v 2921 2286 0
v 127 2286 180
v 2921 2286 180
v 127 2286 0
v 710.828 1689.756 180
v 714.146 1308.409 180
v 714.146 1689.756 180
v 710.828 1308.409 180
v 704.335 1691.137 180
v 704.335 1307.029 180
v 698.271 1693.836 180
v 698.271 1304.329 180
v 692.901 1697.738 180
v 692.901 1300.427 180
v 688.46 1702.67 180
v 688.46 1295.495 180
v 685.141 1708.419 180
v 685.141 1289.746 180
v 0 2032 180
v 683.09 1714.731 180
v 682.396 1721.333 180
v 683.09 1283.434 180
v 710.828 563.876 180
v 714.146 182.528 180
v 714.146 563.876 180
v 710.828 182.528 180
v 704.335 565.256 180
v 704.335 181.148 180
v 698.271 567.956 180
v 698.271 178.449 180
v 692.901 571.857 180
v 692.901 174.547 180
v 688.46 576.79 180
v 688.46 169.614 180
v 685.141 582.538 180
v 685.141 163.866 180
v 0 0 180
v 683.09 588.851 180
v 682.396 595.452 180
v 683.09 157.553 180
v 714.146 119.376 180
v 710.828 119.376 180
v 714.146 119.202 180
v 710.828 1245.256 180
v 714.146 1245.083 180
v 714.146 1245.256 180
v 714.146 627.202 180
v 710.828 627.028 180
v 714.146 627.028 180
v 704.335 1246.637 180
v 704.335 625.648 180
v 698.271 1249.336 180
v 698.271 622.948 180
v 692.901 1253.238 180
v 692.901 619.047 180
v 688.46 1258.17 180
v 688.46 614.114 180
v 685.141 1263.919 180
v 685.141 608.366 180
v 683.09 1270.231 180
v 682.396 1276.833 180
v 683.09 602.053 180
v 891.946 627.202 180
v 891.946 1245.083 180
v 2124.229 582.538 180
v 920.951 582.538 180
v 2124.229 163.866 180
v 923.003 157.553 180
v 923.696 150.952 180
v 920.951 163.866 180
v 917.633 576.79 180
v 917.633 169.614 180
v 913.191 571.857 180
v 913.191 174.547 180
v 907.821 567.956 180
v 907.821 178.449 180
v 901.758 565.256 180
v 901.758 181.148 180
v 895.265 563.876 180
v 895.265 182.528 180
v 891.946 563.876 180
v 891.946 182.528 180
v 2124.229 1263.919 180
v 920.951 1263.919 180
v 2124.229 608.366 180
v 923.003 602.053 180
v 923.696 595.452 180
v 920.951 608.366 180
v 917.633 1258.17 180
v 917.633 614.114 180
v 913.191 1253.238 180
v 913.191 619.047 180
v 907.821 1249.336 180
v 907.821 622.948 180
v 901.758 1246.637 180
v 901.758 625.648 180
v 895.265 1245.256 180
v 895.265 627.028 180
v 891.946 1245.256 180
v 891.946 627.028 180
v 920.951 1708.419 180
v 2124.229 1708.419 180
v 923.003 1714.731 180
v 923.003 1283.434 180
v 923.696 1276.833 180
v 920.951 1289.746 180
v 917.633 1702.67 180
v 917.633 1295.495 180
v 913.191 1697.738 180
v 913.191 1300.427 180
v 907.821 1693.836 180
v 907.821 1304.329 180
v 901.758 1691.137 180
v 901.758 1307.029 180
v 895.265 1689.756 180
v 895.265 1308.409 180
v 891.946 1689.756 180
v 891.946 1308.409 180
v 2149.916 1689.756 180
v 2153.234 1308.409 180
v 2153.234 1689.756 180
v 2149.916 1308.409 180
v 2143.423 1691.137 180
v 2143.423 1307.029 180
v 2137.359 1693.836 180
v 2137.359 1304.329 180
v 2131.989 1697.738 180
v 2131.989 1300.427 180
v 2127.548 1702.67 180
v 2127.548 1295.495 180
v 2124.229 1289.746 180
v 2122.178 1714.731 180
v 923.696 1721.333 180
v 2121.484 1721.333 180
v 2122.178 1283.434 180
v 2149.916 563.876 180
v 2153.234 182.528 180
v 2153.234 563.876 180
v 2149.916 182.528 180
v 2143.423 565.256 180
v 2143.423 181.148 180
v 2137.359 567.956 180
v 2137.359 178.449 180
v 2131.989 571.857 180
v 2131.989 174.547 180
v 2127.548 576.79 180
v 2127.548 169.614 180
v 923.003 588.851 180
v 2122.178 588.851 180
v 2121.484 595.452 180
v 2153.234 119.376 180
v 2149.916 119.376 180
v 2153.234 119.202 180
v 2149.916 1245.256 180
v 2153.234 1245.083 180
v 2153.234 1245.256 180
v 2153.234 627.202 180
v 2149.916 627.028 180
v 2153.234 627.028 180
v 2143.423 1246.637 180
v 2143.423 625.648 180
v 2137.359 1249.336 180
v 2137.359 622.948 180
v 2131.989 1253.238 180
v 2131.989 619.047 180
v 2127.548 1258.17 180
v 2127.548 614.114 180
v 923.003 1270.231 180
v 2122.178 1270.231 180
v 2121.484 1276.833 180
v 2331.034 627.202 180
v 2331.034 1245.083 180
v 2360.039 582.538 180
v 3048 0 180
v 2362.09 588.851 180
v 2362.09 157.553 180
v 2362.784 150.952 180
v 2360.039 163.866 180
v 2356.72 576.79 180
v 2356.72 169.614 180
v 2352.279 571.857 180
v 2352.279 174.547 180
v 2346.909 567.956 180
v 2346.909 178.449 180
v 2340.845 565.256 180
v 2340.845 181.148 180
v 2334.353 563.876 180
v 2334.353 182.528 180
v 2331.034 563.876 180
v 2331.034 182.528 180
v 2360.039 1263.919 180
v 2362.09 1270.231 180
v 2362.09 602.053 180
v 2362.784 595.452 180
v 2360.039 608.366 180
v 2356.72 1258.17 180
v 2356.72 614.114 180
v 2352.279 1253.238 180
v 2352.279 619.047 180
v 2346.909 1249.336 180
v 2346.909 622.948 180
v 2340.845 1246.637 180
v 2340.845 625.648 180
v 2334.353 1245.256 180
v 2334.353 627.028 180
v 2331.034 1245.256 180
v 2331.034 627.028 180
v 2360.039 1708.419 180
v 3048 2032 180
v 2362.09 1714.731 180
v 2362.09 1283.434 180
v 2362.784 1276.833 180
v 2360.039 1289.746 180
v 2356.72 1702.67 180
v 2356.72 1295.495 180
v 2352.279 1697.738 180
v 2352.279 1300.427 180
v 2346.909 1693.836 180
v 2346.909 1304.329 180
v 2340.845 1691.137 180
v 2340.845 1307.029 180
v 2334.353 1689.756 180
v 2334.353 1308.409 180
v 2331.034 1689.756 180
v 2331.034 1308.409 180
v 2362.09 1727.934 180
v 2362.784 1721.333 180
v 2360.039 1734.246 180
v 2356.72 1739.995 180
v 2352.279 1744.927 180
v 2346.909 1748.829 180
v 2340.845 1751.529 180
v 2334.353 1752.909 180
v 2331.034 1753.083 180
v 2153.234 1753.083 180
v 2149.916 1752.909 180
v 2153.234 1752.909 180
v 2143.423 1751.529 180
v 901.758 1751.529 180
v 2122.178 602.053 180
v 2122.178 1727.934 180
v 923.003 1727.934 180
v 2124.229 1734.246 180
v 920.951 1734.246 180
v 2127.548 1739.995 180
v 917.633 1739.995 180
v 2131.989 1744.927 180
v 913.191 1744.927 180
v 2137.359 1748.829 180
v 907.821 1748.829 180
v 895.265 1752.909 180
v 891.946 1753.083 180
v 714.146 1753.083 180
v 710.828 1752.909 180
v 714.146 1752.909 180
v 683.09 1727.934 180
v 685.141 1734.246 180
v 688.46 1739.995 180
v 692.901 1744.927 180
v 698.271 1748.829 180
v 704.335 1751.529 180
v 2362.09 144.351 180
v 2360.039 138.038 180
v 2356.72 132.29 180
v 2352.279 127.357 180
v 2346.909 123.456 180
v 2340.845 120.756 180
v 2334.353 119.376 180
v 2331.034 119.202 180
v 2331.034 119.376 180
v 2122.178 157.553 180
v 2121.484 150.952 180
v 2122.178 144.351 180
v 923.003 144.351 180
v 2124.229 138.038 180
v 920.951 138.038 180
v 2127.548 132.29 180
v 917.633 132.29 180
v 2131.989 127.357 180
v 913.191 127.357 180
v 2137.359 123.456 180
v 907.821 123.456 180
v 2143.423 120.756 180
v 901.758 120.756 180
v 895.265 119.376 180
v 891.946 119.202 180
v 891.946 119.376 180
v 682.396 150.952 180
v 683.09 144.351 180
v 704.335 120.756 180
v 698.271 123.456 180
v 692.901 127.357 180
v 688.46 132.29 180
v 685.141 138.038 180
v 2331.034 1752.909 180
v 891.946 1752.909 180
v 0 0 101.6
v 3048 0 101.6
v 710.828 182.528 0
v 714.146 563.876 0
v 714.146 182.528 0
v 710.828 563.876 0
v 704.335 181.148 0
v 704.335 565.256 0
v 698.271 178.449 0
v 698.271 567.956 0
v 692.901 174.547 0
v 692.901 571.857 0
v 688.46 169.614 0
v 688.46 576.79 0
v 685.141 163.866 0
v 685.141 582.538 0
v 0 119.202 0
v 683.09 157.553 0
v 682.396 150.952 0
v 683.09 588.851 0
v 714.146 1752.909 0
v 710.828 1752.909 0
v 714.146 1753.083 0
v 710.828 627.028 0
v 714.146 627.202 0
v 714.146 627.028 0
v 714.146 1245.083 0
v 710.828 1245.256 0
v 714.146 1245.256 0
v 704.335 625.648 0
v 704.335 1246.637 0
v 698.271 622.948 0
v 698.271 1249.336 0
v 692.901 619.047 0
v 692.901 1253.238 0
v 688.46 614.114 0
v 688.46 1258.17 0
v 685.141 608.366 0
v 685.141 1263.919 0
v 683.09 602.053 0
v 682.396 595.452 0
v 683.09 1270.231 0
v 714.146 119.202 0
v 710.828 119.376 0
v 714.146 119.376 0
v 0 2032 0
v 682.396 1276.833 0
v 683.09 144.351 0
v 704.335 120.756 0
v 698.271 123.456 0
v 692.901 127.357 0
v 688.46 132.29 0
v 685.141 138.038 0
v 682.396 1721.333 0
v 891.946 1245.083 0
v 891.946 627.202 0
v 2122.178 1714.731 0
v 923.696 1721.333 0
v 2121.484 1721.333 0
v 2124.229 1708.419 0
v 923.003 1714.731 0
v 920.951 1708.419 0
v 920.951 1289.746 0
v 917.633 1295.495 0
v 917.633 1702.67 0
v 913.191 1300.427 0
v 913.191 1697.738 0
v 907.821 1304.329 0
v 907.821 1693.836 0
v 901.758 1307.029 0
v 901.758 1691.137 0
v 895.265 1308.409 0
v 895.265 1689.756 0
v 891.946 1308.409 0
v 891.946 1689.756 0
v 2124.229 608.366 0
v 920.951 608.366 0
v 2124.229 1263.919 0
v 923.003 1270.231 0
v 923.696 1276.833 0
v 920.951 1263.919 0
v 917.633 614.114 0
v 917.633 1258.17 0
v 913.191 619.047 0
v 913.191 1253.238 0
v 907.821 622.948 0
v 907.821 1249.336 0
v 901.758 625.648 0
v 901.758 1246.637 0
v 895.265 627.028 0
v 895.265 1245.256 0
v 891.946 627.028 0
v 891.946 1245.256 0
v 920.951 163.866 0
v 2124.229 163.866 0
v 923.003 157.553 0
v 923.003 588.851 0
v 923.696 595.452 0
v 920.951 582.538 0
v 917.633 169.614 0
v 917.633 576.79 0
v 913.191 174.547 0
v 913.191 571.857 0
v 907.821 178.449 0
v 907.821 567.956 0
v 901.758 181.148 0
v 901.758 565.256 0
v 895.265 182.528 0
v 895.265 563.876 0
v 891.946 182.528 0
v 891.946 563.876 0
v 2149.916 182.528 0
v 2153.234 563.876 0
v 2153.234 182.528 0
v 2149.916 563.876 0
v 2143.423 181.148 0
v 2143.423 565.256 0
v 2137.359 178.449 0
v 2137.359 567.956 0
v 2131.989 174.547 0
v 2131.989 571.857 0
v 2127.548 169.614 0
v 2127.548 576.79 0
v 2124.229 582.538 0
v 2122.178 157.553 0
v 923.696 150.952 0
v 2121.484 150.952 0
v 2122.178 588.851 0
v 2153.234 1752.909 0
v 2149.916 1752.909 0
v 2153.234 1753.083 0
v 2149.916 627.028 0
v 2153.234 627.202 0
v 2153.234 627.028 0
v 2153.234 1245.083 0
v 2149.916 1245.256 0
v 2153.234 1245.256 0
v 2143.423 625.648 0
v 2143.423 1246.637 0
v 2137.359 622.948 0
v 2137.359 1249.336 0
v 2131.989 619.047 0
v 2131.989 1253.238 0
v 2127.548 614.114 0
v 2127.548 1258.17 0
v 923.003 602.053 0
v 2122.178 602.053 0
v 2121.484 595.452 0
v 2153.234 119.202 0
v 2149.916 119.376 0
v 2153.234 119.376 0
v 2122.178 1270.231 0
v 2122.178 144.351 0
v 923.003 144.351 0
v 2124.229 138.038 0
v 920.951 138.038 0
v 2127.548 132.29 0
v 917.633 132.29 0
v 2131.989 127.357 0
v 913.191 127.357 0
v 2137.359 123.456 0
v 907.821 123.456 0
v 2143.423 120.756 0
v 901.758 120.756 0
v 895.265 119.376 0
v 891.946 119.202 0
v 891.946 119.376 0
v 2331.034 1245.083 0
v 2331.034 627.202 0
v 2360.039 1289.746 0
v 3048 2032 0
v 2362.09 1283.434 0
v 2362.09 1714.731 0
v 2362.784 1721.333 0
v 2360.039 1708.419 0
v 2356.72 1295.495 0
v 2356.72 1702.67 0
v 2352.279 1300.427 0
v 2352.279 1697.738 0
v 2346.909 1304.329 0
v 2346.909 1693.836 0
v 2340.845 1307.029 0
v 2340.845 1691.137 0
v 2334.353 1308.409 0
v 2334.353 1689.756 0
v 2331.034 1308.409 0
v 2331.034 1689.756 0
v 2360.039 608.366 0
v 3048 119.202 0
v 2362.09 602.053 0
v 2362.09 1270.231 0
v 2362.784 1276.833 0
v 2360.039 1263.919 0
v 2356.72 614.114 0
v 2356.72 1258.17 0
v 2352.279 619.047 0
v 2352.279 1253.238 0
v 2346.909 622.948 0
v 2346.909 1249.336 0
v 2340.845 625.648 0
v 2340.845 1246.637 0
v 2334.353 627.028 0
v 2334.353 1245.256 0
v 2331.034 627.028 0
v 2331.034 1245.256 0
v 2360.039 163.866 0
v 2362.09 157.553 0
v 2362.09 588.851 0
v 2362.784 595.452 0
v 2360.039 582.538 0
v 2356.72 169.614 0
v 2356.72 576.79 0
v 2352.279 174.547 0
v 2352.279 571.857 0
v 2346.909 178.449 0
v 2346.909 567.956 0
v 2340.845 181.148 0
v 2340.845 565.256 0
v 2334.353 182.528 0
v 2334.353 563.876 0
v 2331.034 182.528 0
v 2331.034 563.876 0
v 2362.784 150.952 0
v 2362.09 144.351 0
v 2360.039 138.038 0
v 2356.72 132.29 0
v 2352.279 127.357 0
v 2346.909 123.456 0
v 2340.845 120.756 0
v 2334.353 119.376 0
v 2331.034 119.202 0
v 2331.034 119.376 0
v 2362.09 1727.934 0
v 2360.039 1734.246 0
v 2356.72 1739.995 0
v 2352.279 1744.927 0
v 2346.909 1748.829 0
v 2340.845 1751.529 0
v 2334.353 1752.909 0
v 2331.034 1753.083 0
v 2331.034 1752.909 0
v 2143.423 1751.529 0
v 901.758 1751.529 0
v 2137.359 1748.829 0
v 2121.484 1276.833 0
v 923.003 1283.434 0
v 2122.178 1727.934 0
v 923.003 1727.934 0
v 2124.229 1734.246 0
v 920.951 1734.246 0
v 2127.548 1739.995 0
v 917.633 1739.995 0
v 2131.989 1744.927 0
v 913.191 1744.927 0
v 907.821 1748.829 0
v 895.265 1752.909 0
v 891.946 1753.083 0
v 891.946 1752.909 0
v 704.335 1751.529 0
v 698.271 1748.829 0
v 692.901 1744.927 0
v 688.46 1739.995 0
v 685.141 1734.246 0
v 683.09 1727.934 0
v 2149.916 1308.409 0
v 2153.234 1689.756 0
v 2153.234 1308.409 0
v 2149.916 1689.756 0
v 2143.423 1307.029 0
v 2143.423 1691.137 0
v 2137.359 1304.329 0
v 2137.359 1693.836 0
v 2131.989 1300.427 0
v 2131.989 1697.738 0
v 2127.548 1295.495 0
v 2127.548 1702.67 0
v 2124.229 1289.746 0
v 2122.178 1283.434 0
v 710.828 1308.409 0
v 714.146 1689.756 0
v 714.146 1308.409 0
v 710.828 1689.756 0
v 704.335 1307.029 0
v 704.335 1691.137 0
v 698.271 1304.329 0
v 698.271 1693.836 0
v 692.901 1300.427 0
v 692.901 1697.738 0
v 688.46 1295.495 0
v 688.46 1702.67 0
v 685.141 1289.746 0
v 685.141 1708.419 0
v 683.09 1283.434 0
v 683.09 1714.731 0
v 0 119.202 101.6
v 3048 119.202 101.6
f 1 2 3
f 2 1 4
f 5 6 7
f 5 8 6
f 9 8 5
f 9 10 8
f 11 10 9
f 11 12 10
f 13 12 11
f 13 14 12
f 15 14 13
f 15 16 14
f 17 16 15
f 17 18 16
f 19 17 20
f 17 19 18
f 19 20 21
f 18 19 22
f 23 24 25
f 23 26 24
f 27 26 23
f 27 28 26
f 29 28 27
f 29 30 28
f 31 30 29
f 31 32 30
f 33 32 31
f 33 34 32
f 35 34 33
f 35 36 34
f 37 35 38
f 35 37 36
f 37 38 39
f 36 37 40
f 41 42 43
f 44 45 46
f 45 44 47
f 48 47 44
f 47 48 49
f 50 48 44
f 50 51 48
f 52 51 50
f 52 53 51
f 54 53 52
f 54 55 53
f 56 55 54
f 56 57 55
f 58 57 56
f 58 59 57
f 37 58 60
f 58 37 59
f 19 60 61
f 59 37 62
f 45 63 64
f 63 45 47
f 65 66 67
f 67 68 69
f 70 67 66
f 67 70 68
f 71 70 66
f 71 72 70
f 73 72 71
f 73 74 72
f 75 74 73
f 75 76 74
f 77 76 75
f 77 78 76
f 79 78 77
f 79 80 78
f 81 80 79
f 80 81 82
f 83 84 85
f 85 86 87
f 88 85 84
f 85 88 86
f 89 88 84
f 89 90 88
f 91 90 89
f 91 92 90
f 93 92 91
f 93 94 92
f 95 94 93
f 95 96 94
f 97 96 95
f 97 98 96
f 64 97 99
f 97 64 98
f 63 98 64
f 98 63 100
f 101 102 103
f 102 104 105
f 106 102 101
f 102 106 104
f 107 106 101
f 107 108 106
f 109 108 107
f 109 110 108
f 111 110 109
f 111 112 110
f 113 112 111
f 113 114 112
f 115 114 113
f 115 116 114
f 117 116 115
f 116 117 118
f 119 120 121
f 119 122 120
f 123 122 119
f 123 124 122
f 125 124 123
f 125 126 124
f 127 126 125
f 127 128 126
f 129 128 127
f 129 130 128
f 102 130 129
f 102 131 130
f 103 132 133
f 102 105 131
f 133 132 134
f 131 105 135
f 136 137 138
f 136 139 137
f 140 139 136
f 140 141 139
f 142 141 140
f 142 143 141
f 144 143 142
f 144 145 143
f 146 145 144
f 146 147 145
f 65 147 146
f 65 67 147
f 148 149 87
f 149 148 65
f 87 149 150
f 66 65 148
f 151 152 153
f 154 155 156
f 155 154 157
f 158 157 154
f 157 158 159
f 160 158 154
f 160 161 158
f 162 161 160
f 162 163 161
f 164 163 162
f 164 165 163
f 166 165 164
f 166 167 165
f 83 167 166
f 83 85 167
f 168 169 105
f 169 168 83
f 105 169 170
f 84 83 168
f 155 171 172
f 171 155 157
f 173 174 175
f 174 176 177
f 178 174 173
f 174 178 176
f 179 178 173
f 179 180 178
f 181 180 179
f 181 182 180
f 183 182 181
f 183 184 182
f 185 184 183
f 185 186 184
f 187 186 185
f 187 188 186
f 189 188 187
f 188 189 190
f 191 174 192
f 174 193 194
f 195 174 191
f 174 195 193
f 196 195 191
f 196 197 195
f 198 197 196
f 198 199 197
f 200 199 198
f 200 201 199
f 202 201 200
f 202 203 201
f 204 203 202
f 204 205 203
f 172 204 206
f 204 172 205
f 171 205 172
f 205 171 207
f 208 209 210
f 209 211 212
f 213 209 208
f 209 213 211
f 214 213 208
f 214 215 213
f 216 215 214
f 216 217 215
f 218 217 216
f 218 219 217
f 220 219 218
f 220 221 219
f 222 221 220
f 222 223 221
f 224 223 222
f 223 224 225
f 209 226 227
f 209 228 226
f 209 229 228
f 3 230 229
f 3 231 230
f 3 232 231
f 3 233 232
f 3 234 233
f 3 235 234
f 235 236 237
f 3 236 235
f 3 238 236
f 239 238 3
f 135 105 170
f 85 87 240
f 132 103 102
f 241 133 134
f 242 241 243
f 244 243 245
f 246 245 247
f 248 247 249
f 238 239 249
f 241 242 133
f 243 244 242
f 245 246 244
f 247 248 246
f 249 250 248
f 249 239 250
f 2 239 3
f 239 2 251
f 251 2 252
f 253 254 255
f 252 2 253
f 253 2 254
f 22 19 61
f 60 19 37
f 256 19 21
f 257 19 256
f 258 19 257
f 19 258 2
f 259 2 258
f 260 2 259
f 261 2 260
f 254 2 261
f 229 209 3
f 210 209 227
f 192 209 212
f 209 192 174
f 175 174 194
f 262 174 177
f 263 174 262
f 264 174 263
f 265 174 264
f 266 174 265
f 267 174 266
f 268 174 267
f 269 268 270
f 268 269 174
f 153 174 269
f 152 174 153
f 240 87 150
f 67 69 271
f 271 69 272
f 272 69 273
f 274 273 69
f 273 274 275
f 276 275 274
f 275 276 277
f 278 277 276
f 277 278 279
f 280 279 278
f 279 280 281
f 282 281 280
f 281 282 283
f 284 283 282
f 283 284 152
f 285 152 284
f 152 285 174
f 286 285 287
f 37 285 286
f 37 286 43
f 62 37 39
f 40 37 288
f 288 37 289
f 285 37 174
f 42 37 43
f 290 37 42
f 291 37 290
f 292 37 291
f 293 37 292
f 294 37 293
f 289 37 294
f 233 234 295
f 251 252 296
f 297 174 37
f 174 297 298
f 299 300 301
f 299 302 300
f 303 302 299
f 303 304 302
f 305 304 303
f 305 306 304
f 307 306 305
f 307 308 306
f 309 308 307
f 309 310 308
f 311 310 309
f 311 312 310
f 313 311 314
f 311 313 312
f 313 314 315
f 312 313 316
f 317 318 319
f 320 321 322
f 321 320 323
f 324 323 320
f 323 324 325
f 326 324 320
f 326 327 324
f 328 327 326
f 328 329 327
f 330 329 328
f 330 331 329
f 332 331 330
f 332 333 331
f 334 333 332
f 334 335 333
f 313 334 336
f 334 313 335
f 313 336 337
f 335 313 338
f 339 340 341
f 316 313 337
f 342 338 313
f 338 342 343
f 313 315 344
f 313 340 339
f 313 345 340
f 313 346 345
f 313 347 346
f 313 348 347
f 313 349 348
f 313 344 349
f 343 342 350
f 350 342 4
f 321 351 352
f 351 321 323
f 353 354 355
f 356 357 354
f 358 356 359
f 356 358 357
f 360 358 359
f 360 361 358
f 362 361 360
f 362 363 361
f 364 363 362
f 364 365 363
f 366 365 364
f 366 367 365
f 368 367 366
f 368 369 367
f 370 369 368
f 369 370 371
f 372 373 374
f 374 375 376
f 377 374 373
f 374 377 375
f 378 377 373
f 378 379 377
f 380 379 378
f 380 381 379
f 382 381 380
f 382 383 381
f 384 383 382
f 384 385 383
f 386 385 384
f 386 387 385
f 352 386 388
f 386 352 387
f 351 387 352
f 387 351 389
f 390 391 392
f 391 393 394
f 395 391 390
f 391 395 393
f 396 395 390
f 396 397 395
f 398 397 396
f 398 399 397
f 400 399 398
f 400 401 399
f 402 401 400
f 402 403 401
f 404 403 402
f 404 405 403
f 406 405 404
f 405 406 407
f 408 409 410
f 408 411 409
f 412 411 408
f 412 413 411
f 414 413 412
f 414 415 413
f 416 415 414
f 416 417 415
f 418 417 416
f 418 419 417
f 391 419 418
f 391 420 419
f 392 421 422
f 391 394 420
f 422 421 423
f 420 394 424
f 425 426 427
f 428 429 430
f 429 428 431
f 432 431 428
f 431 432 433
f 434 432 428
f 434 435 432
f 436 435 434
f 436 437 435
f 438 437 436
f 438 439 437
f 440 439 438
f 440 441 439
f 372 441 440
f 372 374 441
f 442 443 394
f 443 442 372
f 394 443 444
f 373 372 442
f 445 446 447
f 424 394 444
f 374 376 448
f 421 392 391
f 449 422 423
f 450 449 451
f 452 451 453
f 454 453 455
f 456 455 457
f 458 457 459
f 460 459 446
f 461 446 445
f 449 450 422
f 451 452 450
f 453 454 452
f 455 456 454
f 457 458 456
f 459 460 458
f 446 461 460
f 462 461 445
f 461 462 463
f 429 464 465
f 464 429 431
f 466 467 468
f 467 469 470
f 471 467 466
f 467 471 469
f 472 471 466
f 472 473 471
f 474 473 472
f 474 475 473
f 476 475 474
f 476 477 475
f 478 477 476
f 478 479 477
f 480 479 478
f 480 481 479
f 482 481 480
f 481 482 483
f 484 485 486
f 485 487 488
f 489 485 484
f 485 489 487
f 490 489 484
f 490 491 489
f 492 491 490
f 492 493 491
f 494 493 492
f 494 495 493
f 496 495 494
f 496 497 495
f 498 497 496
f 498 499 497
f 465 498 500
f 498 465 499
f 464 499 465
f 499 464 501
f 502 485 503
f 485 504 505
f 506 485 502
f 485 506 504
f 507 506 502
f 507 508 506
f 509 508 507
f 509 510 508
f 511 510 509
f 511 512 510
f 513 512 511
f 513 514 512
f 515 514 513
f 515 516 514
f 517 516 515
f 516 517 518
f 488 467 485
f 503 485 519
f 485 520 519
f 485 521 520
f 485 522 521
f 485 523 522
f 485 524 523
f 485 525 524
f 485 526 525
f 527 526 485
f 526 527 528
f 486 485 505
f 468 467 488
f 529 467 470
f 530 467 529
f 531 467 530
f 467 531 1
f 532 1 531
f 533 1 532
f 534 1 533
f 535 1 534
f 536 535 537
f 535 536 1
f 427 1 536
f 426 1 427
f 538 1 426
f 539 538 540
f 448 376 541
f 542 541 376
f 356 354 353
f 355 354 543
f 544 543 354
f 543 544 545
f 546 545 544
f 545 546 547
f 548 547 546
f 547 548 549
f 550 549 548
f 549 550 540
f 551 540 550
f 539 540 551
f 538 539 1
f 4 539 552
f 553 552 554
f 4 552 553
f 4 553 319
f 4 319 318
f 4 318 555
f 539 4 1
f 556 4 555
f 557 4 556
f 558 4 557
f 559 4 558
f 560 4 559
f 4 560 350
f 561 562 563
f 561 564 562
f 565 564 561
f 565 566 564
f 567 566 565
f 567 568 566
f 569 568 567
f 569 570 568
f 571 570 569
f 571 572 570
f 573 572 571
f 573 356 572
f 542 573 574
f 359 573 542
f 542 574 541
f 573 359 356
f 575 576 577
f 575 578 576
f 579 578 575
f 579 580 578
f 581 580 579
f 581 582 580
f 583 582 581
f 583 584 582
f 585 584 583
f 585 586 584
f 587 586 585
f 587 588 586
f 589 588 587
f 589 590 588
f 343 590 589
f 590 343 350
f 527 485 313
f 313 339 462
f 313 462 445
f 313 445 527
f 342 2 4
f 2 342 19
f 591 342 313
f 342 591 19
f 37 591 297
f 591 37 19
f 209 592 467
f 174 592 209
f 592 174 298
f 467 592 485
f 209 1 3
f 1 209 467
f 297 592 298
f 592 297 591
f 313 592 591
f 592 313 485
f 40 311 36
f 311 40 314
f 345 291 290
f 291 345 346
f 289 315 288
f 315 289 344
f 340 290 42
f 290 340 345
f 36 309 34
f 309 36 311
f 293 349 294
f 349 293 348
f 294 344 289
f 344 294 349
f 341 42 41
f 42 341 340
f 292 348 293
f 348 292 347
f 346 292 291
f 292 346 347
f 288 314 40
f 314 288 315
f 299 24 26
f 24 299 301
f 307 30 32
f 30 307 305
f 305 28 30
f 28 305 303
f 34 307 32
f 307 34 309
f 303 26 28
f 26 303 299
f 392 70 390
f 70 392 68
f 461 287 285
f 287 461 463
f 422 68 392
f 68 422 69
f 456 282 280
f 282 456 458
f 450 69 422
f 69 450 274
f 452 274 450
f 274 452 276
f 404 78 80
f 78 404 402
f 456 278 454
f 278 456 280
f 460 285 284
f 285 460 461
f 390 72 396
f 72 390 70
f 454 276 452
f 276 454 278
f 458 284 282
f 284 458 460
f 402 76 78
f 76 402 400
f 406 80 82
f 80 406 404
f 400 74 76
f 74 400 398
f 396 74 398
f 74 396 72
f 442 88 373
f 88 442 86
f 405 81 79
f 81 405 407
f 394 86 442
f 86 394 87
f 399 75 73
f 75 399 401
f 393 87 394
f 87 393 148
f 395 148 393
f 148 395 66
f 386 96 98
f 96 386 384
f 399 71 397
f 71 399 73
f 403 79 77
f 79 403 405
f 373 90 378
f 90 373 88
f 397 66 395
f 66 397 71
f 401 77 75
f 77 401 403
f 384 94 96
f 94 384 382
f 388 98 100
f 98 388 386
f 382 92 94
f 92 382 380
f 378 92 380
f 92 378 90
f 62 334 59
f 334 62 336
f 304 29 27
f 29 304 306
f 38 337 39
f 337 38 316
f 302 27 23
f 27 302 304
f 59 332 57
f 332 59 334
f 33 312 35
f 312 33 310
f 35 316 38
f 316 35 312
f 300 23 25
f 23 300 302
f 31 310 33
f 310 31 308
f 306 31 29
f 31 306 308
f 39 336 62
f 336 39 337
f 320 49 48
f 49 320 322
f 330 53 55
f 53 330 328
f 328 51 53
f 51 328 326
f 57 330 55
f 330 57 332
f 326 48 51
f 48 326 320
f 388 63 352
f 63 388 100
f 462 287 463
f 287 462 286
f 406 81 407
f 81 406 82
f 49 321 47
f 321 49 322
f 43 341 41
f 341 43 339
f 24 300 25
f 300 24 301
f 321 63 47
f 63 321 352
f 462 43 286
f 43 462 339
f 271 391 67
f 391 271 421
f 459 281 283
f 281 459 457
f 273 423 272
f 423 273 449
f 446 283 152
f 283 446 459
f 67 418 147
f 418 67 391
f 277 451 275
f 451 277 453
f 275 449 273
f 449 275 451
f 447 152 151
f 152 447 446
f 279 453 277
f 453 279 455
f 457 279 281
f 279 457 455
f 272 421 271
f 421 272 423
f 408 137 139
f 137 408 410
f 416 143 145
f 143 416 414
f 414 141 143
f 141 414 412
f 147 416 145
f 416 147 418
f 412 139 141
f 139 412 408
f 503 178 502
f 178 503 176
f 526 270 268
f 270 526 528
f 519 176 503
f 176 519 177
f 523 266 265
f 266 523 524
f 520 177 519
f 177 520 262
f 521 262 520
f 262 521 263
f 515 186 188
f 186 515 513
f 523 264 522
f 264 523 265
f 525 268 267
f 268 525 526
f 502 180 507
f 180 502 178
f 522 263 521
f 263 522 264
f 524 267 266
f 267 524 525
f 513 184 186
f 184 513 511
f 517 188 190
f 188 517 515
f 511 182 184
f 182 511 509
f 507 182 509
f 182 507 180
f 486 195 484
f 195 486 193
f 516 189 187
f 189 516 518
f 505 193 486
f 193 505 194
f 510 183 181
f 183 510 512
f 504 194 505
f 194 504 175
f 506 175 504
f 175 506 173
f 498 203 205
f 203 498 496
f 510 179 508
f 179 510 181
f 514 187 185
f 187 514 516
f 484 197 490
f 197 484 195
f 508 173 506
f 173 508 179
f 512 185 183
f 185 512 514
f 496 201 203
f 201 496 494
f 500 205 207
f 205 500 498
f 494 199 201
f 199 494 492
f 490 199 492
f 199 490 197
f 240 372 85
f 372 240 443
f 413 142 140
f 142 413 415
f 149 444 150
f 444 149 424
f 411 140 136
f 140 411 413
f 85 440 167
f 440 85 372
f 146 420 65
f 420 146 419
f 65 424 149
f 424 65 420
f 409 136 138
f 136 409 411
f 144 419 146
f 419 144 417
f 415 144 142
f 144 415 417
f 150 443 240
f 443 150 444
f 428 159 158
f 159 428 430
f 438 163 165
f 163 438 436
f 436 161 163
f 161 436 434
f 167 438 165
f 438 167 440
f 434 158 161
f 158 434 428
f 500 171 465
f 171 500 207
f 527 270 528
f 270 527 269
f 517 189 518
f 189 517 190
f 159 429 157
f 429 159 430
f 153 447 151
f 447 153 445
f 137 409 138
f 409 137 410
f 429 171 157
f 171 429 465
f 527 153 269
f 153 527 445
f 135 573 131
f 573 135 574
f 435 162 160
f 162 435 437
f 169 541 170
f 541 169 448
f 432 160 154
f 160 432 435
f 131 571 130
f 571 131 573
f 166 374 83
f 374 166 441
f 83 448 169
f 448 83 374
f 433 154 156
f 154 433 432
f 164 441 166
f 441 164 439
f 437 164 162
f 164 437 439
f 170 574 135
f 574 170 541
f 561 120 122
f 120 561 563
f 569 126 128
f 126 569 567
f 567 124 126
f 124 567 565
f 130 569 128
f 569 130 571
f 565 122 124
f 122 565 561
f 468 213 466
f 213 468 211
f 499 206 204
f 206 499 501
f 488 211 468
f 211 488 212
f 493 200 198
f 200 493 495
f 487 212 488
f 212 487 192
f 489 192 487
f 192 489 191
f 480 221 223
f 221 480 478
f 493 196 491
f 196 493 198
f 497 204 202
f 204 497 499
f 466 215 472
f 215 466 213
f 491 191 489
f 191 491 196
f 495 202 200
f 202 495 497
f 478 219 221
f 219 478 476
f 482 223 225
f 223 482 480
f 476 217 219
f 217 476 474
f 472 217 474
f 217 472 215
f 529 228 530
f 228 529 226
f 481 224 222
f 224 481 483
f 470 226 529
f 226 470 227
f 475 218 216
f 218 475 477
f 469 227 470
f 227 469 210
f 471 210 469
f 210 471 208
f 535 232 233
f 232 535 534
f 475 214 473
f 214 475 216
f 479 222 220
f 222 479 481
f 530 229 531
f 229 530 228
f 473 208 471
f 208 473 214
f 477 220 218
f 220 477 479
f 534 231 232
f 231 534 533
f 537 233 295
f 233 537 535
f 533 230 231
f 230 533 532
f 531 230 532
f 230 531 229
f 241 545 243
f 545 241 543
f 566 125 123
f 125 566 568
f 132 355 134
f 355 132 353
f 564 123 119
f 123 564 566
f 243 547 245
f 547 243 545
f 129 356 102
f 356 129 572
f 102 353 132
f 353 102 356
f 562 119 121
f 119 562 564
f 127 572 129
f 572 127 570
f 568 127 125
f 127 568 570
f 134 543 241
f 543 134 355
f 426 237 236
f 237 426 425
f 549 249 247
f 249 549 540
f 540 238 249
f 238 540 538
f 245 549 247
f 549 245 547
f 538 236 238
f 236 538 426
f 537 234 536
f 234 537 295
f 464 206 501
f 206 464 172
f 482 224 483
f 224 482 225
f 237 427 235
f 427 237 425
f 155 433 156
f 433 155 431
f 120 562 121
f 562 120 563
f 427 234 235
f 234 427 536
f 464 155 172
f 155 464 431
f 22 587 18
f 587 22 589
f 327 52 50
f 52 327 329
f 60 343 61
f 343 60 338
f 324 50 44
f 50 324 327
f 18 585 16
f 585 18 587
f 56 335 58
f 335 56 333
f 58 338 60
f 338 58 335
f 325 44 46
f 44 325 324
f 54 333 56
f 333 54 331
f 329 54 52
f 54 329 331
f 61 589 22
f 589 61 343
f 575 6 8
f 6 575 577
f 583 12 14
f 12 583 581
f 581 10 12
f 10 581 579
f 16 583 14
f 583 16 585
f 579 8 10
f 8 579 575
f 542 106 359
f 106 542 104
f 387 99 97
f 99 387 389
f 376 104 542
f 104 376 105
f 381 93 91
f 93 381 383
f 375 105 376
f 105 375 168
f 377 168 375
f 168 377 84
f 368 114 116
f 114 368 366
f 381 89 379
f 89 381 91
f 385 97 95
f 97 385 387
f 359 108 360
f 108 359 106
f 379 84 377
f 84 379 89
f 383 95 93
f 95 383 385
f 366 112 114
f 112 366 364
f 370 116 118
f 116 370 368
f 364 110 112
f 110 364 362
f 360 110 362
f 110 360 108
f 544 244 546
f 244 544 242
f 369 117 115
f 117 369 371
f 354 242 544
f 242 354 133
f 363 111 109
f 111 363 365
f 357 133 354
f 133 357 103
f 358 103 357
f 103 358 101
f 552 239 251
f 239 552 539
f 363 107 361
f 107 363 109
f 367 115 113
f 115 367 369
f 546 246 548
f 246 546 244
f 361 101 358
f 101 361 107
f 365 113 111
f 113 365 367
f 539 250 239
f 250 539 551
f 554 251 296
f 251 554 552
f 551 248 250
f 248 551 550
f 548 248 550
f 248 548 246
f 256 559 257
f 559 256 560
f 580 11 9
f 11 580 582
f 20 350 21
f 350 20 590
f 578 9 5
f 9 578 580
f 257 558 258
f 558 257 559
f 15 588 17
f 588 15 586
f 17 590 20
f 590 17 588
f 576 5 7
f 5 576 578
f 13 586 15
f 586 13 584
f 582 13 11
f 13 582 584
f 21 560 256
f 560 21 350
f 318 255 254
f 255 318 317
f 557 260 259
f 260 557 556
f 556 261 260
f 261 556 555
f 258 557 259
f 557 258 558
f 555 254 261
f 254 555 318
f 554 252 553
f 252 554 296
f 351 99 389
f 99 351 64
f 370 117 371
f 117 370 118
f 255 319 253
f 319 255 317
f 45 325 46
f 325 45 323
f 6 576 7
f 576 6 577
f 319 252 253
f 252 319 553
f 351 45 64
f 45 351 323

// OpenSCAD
// file: global_constants.scad
// unit = 0.1 mm
// 1 inch = 25.4 mm = 254 units

// Dimensions

// Sheet dimensions
sheet_x=24400;
sheet_y=12200;
sheet_z=180;

// Circular cnc routing holes
cnc_circle_r=31.750;
module routing_circle(x,y){
  translate([x,y]) linear_extrude(height=sheet_z) circle(cnc_circle_r);
}

//Conversion
medievaltometric=254;
metrictomedieval=.0039370078;

// Use the metric system by default
// units="medieval";
units="metric";
// main file
// To render the DXF file from the command line:
// openscad -x cradle.dxf -D'units="metric"' cradle.scad

include <global_constants.scad>

cradle_hole_x=177.8;
cradle_hole_y=508;

edge_to_holes_x=714.1464;
bottom_cube_cutout_y=119.2022;

module cradle_hole(){
  x=cradle_hole_x;
  y=cradle_hole_y;
  routing_circle(0,cnc_circle_r);
  routing_circle(x,cnc_circle_r);
  routing_circle(x,y-cnc_circle_r);
  routing_circle(0,y-cnc_circle_r);
  cube([177.8,508,sheet_z]);
}

module cradle_holes(){
  xdistance=1261.2878;
  ydistance=617.8804;
  translate([edge_to_holes_x,bottom_cube_cutout_y,0]) {
    cradle_hole();
    translate([xdistance+cradle_hole_x,0]) cradle_hole();
    translate([xdistance+cradle_hole_x,ydistance+cradle_hole_y]) cradle_hole();
    translate([0,ydistance+cradle_hole_y]) cradle_hole();
  }
}

module cradle_half(){
  x_e=3048;
  x_i=2794;
  y_e=2286;
  y_i=2032;
  bottom_cube_cutout_z=101.6;

  render(convexity = 10){
    difference(){
      linear_extrude(height=sheet_z) polygon([[0,0],[x_e,0],[x_e,y_i],[x_e-(x_e-x_i)/2,y_e],[(x_e-x_i)/2,y_e],[0,y_i],[0,0]]);
      cube([x_e,bottom_cube_cutout_y,bottom_cube_cutout_z]);
    }
  }
}

module cradle() {
  render (convexity = 10){
    difference(){
      cradle_half();
      cradle_holes();
    }
  }
}

if (units=="metric") cradle();
if (units=="medieval") scale([metrictomedieval,metrictomedieval,metrictomedieval]) cradle();
